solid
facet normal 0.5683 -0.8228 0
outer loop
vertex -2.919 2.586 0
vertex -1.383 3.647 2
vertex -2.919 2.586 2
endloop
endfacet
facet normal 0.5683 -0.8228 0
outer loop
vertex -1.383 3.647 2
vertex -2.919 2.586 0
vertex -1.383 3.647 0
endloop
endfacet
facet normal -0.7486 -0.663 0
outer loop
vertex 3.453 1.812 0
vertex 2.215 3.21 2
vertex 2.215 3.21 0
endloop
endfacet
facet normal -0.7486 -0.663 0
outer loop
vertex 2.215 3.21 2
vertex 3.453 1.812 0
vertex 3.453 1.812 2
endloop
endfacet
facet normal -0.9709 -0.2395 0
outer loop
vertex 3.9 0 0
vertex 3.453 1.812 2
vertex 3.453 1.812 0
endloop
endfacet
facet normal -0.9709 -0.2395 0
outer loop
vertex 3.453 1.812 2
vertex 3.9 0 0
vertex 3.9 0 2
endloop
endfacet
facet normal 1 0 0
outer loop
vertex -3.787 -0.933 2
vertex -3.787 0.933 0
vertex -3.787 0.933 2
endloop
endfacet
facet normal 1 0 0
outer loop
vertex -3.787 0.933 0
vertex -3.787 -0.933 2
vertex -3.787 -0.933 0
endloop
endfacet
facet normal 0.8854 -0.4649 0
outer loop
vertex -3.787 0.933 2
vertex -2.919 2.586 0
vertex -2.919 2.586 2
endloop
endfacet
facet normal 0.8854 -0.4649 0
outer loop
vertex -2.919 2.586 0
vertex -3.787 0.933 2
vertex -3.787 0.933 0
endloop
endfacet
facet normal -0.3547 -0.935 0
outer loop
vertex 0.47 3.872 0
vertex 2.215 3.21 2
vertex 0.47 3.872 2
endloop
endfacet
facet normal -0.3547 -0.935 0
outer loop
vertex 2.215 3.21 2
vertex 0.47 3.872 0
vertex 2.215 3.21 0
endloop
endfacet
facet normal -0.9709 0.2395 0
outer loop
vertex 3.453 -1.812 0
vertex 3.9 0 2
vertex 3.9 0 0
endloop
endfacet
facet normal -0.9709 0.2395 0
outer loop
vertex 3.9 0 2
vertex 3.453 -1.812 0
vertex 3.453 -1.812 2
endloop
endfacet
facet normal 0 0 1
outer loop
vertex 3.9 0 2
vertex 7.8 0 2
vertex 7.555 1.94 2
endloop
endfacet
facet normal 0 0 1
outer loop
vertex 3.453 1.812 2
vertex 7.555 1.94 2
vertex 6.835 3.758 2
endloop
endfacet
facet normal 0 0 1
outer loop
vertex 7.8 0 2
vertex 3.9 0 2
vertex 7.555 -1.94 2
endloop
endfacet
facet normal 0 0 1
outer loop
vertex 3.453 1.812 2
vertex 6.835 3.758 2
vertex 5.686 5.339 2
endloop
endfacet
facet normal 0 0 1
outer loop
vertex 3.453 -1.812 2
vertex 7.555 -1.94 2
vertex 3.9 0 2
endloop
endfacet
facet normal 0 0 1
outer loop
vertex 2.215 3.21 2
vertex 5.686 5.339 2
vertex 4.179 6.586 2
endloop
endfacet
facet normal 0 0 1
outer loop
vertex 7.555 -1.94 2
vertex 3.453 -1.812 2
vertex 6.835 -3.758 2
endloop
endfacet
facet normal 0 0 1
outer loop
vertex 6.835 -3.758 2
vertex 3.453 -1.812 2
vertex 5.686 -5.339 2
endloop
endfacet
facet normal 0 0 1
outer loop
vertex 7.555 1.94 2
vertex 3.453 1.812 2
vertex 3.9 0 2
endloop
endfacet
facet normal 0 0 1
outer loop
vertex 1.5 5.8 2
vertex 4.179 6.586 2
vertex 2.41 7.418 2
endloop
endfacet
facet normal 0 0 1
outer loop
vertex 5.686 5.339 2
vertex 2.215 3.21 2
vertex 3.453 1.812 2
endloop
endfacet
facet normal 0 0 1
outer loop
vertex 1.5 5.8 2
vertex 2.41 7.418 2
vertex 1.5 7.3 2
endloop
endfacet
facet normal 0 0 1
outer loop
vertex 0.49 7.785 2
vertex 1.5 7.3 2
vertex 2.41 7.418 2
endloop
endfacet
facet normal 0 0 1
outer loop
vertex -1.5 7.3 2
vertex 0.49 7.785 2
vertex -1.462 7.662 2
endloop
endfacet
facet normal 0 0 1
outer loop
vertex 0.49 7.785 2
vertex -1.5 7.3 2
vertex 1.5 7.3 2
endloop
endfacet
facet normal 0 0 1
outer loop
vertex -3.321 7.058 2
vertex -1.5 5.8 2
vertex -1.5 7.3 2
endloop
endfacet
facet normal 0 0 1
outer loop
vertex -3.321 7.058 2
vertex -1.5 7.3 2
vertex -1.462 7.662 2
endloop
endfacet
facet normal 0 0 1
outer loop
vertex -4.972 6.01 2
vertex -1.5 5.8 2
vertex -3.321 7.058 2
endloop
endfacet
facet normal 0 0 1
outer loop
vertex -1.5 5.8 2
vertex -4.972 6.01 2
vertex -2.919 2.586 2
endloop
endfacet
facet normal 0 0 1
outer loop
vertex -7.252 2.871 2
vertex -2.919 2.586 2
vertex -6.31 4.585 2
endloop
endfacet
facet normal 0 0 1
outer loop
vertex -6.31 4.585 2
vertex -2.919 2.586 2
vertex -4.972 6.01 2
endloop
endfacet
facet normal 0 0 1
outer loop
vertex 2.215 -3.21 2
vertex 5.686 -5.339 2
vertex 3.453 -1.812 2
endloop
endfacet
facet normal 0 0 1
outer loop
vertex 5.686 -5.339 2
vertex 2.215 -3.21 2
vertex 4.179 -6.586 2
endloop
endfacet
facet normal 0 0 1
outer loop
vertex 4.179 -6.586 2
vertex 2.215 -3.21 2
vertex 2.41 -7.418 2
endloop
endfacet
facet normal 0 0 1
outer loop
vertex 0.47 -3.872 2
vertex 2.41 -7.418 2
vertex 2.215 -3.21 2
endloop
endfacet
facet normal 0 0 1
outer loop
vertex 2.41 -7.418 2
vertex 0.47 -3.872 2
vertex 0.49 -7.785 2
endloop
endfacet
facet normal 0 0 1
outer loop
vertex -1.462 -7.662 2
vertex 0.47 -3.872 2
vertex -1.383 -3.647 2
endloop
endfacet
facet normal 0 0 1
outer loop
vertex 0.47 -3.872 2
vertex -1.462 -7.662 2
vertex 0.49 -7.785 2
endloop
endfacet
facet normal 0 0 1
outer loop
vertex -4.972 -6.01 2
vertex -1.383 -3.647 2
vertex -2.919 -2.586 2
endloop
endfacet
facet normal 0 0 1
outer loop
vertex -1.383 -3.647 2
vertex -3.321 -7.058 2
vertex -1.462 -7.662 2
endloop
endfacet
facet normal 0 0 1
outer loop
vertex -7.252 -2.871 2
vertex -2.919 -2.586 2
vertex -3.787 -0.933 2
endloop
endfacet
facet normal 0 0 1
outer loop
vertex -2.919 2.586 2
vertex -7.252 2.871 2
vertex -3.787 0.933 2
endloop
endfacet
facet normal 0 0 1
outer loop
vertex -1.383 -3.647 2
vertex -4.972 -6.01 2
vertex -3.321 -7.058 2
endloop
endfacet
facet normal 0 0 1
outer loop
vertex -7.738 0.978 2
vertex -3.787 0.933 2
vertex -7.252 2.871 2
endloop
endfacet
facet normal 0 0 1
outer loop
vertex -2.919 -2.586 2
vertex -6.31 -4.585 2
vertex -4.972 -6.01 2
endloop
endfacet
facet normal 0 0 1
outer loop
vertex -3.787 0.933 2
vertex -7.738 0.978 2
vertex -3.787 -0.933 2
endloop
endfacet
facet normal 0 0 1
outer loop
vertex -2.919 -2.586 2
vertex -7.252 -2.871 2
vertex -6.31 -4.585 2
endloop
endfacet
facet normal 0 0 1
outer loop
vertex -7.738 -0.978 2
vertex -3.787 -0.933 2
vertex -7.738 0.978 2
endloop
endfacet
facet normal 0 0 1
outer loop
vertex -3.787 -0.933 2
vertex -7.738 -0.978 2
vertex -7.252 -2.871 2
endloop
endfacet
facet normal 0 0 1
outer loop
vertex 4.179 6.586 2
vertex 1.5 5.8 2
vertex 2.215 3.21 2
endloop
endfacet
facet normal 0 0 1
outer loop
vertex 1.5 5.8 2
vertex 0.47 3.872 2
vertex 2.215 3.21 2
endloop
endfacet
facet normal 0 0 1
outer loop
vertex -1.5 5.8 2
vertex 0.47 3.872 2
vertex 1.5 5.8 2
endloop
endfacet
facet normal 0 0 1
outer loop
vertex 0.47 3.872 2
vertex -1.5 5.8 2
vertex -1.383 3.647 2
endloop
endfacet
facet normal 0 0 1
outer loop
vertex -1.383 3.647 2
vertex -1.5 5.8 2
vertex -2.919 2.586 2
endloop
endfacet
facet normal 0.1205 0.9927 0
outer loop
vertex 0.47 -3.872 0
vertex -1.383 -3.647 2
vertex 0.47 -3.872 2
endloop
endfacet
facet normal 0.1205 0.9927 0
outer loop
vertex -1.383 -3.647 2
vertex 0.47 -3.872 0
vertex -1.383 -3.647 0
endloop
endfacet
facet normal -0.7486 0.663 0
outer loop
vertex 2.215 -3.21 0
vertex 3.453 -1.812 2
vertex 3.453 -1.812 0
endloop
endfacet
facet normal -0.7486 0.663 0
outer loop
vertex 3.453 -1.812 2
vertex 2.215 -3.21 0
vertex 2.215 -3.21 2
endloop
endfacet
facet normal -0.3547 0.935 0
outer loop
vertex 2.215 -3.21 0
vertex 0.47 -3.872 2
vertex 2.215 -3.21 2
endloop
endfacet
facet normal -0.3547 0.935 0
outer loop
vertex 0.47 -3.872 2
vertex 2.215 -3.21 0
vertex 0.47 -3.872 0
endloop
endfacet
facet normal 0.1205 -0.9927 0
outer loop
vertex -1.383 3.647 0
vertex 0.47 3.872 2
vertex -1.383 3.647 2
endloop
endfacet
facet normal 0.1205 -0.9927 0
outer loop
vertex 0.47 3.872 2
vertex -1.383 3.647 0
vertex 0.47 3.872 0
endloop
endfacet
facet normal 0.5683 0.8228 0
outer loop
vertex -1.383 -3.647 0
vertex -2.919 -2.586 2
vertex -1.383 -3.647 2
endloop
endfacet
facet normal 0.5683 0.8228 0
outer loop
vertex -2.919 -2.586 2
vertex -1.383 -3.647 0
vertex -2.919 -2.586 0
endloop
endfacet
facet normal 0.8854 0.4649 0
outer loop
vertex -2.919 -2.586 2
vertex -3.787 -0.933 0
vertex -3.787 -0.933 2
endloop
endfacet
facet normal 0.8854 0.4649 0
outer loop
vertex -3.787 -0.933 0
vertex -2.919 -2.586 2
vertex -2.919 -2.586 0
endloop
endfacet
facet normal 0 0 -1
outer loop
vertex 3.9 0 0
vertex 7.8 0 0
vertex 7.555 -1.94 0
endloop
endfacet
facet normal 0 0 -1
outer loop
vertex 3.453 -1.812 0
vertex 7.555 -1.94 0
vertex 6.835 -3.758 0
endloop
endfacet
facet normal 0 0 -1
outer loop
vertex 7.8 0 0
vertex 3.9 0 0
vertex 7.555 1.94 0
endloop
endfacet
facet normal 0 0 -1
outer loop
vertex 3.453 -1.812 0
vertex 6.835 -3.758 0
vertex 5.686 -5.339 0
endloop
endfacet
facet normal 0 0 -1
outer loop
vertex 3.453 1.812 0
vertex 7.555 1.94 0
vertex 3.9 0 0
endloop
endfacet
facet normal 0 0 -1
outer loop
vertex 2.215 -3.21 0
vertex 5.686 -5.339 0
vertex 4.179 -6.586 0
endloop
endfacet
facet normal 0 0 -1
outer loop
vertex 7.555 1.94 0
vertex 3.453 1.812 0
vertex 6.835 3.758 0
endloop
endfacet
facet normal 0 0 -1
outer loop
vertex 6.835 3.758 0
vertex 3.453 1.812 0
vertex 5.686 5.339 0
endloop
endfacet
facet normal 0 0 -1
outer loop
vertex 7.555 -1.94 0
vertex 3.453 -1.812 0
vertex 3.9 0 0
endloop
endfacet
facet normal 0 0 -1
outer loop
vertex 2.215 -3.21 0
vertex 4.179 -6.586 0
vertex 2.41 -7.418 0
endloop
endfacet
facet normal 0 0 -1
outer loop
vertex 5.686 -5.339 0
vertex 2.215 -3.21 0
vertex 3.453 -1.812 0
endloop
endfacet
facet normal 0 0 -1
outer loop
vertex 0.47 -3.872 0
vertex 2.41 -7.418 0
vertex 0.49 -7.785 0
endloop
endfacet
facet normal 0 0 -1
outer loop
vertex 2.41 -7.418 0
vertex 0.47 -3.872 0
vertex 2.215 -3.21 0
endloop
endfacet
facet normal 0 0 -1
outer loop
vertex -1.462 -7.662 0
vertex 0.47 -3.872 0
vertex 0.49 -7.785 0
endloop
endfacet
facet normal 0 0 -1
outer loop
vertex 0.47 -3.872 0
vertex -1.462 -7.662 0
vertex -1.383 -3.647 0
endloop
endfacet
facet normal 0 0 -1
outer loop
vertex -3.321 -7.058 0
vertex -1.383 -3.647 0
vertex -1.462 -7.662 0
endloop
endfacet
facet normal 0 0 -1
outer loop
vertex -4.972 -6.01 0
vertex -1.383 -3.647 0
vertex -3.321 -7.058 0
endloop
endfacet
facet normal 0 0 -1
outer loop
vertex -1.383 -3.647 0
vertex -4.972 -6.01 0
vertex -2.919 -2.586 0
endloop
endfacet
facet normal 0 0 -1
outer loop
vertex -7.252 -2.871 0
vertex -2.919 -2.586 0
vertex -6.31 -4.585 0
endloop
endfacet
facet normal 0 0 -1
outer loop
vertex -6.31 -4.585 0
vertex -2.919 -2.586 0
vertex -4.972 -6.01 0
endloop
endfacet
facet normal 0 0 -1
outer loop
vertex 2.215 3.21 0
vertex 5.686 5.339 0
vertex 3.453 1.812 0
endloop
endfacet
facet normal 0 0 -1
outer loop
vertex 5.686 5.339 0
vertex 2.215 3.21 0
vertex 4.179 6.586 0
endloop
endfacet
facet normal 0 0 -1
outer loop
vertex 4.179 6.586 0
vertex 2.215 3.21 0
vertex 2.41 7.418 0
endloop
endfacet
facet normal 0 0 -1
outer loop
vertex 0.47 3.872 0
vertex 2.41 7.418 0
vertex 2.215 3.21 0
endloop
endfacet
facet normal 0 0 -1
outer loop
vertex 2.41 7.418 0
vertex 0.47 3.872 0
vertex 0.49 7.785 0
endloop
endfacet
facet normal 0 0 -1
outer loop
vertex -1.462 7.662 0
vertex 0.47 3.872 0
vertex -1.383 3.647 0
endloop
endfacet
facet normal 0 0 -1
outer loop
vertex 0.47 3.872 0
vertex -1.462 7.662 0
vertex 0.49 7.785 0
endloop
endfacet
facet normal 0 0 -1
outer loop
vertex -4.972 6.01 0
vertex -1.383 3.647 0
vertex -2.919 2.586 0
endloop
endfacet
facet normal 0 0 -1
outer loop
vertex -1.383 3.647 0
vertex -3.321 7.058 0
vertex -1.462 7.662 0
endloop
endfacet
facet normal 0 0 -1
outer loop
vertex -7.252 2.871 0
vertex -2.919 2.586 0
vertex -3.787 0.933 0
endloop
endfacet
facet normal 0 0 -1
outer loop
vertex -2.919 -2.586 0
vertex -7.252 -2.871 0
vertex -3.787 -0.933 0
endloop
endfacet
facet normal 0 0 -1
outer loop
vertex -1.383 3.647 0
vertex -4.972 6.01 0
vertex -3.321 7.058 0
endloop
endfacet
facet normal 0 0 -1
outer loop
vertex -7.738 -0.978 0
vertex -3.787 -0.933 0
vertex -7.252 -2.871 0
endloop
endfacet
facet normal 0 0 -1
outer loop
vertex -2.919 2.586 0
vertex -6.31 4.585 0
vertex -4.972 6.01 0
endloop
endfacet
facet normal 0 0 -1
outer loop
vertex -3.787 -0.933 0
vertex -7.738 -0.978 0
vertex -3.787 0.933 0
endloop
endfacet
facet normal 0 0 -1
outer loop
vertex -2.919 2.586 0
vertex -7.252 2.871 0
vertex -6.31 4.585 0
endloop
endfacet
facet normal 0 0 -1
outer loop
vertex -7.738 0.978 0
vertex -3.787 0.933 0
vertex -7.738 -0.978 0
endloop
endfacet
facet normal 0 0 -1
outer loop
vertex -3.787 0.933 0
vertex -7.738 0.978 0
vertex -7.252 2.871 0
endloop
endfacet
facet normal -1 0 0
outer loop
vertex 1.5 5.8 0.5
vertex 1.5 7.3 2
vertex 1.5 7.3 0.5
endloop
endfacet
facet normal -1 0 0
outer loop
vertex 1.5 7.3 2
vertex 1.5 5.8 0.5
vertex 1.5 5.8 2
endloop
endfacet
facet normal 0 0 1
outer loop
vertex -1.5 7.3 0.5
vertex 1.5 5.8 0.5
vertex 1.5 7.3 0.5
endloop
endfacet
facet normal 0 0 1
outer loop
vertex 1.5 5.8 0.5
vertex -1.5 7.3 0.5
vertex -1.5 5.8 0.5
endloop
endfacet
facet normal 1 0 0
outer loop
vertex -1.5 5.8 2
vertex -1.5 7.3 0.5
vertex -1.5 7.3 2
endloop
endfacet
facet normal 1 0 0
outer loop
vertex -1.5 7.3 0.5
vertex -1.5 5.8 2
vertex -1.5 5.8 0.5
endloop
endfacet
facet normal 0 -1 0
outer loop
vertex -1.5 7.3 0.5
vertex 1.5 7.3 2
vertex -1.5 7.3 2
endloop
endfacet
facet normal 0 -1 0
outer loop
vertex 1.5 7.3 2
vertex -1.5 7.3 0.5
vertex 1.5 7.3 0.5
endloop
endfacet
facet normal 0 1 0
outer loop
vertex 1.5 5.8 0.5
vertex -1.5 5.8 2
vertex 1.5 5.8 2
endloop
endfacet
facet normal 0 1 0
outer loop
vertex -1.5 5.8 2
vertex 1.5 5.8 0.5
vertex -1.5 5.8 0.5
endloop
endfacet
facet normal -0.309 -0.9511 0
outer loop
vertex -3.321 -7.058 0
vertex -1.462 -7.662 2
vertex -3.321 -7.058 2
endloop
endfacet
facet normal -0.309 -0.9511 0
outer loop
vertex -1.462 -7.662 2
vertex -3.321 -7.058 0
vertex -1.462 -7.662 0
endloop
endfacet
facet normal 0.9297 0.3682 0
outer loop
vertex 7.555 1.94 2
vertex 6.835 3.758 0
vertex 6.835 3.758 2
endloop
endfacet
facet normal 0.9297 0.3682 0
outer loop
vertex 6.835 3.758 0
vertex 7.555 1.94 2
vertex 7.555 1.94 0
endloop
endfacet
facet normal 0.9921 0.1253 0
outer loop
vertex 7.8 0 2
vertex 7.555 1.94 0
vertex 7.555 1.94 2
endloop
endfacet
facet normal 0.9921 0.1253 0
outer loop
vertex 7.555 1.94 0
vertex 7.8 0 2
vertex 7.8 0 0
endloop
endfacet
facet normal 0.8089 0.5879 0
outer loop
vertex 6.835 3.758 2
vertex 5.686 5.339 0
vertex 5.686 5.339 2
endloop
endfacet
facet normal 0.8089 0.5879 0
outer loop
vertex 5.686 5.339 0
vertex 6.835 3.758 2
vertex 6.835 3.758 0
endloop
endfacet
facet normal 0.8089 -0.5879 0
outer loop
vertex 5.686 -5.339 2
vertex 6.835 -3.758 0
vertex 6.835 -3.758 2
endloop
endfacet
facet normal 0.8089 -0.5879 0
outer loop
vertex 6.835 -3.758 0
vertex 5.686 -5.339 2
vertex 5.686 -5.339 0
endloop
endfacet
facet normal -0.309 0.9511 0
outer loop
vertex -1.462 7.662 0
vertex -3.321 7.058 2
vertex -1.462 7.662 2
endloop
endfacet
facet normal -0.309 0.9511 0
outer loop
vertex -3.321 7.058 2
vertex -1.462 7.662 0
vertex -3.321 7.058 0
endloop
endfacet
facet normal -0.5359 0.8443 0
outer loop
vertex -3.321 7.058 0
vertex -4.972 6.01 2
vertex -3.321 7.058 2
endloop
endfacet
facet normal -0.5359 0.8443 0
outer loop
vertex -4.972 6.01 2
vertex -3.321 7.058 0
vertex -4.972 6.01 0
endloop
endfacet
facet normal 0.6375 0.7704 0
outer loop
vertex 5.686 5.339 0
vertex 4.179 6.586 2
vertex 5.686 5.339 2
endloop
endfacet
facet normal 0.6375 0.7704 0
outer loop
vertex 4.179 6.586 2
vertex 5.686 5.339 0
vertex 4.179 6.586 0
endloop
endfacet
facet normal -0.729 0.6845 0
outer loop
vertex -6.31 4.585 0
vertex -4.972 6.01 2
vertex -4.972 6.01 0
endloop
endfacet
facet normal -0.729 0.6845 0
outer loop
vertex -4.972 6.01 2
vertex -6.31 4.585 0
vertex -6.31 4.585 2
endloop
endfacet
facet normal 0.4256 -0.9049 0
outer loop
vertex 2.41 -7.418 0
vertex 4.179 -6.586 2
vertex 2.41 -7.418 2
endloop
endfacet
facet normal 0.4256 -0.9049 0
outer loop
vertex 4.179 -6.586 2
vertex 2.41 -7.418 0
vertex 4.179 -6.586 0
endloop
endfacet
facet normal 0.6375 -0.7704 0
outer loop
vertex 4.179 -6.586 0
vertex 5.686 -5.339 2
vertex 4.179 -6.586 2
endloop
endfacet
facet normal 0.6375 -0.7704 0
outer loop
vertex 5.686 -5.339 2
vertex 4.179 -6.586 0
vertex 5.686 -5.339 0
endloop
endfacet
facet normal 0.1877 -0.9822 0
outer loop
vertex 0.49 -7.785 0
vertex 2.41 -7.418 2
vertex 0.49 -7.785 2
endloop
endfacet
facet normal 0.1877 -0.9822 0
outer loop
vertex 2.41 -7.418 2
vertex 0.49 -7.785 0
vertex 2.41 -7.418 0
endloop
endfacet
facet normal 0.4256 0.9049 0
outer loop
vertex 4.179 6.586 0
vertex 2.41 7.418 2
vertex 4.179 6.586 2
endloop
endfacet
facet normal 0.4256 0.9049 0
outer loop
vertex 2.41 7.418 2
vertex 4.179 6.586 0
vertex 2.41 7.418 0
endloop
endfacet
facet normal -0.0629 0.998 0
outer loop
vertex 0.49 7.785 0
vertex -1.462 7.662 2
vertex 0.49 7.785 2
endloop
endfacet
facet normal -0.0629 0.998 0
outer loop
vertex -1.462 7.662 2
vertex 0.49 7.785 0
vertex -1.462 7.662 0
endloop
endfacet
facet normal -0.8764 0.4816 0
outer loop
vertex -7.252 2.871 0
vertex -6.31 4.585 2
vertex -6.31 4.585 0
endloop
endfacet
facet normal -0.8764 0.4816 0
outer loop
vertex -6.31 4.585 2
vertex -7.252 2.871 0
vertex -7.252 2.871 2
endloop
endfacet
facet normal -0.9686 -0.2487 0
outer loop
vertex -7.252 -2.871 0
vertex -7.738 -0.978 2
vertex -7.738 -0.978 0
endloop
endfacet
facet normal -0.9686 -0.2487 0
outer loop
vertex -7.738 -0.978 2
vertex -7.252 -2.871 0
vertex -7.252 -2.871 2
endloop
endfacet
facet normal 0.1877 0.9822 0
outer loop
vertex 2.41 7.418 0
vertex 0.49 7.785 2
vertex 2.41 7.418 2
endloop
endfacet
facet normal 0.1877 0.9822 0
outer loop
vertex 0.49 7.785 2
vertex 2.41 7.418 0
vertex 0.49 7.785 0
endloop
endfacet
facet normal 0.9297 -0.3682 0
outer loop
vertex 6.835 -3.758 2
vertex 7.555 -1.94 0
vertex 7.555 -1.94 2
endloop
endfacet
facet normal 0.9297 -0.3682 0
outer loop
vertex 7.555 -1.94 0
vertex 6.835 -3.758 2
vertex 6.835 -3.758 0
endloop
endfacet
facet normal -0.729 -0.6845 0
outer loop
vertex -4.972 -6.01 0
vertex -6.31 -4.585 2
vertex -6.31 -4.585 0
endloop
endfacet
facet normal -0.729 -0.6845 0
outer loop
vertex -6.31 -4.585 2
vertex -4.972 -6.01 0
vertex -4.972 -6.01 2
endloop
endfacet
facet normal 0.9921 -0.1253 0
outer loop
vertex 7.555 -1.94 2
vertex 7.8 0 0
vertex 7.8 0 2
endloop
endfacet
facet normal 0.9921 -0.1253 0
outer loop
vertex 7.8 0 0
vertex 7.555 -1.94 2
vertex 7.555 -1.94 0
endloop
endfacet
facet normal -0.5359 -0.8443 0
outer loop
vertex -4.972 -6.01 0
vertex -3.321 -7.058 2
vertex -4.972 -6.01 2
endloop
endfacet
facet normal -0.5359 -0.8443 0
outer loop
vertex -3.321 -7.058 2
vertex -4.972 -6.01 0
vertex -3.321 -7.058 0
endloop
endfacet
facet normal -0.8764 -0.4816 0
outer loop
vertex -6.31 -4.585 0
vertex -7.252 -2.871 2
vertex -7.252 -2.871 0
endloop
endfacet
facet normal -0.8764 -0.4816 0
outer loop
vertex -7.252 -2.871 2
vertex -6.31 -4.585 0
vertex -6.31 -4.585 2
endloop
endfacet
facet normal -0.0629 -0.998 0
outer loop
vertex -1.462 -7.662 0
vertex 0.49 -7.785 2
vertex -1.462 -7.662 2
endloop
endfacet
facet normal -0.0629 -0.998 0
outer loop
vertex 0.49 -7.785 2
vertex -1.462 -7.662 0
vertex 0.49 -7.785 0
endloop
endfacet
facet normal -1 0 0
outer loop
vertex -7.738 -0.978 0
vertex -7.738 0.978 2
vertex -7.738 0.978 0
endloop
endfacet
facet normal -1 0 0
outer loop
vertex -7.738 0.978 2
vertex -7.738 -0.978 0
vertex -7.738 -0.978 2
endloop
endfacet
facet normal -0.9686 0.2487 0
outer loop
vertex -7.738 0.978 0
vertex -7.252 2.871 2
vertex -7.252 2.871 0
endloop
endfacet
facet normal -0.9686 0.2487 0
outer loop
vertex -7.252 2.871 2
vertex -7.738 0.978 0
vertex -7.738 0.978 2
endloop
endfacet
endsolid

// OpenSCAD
encoder_hole_depth = 2;
encoder_hole_dia = 6.8;
hole_extra = 0.5;
tab_dist = 2.4;
tab_w = 2*1.5;
tab_h = 0.5*3;
tab_d = 1.5;
tab_tolerance = 0.2;

module encoder_hole() {
    translate([0,0,encoder_hole_depth/2]) {
        cylinder(r=encoder_hole_dia/2+hole_extra,h=encoder_hole_depth, center=true);
    }
    translate([-tab_w/2,tab_dist+encoder_hole_dia/2,encoder_hole_depth-tab_d]) {
        cube([tab_w, tab_h, tab_d]);
    }
}

//encoder_hole();

module hole_test() {
    difference() {
        translate([0,0,encoder_hole_depth/2])  {cylinder(r=encoder_hole_dia/2+tab_dist+2,h=encoder_hole_depth, center=true);}
        encoder_hole();
    }
}

hole_test();
